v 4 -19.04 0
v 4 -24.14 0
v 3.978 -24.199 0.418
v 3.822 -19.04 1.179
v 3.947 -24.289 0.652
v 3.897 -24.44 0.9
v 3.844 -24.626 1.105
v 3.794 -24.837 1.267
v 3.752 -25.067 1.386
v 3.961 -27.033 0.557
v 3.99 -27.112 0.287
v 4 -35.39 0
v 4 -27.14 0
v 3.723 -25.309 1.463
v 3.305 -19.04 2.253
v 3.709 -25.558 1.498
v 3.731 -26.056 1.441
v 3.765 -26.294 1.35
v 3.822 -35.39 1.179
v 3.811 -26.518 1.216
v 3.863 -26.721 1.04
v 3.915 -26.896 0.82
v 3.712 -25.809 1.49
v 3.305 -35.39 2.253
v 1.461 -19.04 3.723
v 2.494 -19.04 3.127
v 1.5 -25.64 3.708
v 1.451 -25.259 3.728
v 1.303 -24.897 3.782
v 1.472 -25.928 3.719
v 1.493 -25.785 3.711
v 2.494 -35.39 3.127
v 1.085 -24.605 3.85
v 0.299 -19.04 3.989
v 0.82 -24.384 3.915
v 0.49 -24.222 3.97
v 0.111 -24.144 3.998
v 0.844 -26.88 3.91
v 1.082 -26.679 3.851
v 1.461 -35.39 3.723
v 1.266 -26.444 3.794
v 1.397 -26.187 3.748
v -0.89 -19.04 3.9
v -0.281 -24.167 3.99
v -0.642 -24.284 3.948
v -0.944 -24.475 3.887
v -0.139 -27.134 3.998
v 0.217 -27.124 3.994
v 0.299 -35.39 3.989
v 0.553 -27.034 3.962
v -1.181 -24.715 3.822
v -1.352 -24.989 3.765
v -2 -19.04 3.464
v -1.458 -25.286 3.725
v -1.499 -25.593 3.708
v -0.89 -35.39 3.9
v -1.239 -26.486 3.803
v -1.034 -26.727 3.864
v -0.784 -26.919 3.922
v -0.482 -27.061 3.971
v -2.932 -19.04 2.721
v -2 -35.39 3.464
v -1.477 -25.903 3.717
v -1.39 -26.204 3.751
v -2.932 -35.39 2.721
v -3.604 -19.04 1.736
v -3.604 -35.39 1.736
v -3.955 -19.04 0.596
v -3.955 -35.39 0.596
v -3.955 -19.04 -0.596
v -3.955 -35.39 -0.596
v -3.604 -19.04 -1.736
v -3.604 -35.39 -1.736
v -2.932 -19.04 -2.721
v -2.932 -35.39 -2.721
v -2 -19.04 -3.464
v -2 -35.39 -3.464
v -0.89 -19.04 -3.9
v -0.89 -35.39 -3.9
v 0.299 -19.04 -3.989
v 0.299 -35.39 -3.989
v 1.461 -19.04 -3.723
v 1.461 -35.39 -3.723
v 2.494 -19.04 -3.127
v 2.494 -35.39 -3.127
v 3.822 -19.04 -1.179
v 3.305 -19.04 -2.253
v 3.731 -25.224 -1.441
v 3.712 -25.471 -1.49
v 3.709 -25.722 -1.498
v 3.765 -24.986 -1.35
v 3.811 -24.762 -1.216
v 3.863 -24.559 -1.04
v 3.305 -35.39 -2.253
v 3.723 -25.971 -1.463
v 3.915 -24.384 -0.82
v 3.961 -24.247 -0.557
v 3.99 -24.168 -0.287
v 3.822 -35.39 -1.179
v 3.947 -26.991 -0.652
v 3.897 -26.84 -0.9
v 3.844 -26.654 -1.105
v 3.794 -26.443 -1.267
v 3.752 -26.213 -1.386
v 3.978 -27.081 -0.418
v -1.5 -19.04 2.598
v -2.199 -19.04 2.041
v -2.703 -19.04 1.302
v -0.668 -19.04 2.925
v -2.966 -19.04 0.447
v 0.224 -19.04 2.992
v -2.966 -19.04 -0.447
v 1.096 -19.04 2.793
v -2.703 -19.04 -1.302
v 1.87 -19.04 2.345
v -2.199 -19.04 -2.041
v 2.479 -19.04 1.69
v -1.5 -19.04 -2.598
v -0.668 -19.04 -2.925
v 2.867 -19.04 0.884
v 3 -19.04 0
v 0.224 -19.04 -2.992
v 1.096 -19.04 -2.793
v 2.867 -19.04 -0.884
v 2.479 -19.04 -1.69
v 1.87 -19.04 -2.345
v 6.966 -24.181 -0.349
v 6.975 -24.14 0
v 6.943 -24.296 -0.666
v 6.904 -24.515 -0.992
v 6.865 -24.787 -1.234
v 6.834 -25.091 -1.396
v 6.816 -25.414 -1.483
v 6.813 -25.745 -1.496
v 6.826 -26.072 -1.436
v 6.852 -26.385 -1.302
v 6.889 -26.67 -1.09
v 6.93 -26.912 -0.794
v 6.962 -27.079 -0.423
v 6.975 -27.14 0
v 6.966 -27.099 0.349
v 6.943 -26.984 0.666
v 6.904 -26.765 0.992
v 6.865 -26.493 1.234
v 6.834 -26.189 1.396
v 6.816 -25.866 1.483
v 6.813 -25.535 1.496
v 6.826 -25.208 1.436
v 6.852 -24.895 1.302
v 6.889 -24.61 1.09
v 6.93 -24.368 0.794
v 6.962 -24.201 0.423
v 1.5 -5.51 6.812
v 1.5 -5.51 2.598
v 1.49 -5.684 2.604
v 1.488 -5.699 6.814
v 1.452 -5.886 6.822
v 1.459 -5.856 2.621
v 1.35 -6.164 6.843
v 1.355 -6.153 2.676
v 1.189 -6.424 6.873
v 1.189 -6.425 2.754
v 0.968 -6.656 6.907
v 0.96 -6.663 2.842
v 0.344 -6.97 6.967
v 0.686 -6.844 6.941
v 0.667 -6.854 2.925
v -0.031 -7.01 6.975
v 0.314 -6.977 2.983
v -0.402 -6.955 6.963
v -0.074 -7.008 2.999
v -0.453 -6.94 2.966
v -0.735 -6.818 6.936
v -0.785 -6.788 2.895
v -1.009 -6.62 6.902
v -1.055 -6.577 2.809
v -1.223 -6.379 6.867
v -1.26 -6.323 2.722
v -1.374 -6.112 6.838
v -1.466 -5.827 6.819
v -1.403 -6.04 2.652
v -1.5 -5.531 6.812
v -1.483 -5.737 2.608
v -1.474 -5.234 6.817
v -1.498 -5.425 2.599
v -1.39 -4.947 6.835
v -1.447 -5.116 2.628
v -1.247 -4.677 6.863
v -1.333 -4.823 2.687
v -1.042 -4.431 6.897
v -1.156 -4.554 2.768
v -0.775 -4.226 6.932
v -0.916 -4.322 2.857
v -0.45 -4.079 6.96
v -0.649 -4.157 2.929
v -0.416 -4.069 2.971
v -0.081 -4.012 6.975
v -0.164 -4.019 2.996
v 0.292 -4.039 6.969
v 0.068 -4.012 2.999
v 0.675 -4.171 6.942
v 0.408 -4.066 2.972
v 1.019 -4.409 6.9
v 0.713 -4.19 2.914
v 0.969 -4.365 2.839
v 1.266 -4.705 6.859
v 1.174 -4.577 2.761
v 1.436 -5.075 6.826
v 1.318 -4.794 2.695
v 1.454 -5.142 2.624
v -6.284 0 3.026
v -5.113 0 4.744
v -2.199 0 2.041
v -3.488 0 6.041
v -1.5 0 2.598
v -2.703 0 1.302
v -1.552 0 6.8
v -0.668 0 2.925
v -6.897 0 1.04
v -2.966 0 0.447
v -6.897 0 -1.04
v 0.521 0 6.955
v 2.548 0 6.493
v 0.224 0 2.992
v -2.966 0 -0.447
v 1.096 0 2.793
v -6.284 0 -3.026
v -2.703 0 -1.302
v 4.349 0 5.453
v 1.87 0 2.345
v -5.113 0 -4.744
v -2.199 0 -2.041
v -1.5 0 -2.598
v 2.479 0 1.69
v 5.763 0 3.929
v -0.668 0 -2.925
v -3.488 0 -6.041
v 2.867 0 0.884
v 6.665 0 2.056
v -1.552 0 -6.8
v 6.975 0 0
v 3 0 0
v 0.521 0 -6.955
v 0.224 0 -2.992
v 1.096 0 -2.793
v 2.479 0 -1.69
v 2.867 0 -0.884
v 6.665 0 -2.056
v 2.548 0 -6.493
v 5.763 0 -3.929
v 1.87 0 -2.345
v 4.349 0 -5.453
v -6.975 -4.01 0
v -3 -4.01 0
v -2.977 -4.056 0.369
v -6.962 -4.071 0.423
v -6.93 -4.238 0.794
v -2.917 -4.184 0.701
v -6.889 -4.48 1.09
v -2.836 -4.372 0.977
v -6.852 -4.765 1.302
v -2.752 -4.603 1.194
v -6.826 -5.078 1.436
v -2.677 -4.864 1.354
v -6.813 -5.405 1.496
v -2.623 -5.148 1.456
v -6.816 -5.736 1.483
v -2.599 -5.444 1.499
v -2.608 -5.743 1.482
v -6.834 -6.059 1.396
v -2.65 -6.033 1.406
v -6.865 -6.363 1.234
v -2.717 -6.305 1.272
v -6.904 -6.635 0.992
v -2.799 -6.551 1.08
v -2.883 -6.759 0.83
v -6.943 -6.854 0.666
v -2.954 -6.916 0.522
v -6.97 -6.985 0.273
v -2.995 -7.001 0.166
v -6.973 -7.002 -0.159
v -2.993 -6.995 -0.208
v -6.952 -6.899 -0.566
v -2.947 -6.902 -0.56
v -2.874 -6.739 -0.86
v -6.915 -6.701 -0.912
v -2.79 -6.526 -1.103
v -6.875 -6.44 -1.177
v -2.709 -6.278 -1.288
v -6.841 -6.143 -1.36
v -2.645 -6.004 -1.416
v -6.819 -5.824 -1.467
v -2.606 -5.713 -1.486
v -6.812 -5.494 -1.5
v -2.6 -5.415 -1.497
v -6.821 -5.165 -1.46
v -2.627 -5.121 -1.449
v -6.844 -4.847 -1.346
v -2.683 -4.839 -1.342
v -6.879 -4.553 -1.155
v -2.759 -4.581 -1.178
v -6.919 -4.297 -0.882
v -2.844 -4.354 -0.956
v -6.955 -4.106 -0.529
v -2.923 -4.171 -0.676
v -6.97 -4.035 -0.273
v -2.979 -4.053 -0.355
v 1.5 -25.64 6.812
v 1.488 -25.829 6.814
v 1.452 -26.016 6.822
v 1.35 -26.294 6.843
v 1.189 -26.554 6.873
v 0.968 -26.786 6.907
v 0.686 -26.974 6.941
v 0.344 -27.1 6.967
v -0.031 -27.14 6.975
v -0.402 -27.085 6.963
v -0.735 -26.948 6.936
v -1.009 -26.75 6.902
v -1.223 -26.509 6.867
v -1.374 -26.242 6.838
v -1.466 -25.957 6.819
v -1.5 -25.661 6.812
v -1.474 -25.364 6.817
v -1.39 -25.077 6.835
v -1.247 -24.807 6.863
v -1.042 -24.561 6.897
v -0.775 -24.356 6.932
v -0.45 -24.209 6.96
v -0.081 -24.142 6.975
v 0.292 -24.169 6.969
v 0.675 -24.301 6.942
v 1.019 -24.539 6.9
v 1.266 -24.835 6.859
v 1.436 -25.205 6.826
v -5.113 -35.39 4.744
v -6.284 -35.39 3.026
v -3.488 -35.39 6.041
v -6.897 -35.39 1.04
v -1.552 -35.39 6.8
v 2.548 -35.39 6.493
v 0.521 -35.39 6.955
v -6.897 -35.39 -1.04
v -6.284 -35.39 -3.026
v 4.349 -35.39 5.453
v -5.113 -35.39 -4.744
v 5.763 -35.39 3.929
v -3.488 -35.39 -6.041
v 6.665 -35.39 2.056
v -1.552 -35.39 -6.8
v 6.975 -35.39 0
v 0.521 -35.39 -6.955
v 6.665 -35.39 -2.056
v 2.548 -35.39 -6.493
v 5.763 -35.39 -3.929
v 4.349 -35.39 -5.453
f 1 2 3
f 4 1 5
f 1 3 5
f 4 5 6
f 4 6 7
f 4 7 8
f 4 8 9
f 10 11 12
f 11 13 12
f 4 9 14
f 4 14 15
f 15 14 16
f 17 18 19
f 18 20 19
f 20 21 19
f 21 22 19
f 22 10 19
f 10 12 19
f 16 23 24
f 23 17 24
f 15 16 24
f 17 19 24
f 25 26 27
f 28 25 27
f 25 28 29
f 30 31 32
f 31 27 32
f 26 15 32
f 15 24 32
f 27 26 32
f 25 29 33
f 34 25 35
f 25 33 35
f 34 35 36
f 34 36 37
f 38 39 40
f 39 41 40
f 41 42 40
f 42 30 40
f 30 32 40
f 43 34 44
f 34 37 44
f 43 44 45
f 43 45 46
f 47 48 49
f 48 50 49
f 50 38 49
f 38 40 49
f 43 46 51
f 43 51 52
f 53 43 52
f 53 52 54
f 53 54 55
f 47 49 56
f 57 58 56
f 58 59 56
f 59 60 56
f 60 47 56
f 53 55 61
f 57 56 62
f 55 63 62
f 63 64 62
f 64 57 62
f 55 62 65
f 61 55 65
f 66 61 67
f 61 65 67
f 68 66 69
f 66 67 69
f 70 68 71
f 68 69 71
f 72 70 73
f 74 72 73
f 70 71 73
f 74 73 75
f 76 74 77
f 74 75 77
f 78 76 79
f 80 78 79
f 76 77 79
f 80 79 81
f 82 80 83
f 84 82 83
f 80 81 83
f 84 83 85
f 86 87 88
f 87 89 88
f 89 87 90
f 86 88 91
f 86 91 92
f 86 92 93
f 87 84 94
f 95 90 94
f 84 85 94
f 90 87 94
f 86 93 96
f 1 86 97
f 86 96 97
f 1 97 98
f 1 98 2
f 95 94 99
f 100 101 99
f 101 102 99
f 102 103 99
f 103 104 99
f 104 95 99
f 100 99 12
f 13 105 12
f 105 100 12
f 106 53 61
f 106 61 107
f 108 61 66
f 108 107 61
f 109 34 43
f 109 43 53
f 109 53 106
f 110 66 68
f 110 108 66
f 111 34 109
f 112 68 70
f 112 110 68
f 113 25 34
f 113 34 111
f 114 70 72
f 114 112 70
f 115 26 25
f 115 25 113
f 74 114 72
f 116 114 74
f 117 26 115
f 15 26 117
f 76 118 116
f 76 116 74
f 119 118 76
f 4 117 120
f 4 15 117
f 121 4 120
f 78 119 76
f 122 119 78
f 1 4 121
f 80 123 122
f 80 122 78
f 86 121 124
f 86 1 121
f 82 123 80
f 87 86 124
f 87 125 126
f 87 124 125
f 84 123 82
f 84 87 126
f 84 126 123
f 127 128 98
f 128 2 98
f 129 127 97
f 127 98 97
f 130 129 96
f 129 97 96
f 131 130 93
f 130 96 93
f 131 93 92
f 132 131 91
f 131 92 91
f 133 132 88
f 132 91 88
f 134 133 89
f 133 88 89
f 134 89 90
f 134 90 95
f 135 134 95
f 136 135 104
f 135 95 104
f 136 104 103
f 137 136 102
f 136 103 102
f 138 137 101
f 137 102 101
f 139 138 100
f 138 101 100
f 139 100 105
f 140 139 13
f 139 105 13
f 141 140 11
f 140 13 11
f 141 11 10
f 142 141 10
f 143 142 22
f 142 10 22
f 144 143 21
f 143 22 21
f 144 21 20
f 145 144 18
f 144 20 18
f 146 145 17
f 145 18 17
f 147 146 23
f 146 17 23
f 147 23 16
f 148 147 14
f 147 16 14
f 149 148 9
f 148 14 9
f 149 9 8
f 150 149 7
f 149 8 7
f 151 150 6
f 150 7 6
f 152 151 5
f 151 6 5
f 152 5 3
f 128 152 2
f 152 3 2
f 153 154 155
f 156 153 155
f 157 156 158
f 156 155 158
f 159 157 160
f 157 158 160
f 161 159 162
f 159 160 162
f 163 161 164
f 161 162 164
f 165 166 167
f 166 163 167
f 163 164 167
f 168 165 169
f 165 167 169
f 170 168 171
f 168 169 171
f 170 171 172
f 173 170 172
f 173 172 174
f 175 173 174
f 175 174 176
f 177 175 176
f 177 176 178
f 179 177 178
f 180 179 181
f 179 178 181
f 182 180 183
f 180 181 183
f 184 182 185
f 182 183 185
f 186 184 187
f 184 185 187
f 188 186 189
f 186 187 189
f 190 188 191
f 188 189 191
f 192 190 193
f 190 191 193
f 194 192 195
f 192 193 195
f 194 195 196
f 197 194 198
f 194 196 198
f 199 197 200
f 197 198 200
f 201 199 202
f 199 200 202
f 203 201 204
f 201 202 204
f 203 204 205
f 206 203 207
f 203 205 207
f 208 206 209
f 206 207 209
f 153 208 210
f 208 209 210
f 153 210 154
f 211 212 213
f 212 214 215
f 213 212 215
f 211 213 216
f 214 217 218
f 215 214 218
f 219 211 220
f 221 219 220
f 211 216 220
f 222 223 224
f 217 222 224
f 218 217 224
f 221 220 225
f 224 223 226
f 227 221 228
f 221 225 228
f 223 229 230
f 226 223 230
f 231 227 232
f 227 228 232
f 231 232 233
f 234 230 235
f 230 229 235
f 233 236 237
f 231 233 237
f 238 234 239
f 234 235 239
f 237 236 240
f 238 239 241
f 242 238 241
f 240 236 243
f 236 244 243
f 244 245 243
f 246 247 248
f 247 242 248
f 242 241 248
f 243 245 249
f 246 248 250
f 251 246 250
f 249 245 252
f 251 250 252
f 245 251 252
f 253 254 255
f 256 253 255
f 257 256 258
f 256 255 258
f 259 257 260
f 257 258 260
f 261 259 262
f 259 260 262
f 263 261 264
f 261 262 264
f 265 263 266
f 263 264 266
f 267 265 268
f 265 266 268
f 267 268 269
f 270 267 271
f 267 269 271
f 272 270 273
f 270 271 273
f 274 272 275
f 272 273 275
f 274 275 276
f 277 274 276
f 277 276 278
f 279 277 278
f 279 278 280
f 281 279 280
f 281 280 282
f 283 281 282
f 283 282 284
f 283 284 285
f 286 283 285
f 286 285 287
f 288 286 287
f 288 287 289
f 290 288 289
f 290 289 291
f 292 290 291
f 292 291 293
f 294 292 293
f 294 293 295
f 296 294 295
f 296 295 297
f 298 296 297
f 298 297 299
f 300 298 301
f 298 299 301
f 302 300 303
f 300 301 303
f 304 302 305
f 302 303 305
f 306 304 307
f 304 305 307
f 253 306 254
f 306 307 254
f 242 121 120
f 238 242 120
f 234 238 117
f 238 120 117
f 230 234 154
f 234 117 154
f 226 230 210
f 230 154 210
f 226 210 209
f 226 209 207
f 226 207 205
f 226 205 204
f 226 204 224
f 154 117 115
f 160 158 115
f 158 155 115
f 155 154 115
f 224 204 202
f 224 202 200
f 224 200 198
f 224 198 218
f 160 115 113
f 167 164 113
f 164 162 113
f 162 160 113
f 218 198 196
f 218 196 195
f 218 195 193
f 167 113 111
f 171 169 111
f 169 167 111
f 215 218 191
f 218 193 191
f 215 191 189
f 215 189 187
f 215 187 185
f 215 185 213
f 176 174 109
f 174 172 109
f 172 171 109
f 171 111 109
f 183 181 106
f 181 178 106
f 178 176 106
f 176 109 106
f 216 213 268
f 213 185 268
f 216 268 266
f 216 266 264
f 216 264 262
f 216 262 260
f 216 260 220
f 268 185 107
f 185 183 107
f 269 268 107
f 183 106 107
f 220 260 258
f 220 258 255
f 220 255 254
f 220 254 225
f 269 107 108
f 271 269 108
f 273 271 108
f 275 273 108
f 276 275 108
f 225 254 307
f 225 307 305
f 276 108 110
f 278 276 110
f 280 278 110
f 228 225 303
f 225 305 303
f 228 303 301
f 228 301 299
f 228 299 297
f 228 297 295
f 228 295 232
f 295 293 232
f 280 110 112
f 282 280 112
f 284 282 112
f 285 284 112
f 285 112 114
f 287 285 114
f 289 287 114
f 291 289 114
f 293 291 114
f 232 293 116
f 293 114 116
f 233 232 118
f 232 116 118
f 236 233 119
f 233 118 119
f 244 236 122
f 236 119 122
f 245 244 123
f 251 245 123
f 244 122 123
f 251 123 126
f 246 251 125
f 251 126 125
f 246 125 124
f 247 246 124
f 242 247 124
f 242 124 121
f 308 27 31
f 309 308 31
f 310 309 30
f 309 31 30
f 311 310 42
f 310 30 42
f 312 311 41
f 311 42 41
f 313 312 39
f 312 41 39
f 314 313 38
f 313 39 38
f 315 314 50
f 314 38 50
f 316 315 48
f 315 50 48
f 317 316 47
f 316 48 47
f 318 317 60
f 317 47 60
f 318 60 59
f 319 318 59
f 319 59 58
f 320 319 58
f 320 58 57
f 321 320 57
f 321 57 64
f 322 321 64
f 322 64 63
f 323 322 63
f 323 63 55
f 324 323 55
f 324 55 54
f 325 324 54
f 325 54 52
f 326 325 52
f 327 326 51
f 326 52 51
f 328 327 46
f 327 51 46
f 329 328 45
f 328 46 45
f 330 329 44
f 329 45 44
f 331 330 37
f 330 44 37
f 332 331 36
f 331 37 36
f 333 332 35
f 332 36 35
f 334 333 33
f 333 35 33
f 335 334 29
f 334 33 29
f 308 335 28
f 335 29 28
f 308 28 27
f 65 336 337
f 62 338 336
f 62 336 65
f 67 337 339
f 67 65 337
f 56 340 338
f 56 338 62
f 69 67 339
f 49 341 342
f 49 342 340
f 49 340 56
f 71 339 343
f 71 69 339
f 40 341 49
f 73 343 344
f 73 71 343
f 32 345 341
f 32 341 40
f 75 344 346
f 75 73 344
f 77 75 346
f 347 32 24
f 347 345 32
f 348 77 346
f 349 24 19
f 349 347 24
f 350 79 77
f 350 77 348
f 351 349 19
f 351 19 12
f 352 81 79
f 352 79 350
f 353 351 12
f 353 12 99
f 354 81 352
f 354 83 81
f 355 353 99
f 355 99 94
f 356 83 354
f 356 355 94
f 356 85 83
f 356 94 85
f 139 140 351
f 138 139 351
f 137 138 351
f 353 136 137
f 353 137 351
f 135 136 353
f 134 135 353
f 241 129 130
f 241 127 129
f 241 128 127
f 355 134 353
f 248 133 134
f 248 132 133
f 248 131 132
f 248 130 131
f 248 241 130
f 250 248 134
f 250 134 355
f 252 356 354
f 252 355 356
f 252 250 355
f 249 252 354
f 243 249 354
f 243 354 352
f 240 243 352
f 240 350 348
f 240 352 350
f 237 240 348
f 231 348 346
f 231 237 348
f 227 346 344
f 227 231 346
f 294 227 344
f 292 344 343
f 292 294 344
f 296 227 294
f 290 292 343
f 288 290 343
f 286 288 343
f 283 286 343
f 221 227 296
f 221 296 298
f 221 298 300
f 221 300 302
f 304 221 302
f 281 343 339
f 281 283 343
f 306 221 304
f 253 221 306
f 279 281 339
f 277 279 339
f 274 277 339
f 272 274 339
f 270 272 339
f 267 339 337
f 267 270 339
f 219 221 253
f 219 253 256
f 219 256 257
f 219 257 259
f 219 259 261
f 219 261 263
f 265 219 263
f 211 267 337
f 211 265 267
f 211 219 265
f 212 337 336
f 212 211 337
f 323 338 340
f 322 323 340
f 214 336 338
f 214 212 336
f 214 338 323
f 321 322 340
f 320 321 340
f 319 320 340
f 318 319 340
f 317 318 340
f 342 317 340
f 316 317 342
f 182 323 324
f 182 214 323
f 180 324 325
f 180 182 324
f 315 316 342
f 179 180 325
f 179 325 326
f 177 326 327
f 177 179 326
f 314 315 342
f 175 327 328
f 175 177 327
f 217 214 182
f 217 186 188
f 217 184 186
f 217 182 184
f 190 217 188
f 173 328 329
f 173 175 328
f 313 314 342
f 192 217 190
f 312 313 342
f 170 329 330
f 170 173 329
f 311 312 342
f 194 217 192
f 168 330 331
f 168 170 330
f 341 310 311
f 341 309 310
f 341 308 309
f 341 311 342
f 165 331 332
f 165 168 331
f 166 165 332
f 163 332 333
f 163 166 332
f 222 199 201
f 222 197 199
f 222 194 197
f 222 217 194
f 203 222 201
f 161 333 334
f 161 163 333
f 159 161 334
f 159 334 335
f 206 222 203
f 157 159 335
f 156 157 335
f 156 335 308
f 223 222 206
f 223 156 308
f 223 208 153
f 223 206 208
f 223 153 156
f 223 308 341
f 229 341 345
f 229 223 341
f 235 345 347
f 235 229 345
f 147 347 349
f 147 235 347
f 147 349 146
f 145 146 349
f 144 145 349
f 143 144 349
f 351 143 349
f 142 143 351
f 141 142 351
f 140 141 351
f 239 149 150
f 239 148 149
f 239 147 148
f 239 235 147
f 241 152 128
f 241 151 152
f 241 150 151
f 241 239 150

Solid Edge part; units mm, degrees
sketch "Sketch1" plane through (0, 0, 0) normal (0, -1, 0) x (1, 0, 0)
  circle A0 centre (0, 0) radius 6.975
extrude "Protrusion1" add sketch "Sketch1" along normal blind 35.39
sketch "Sketch2" plane through (0, -35.39, 0) normal (0, -1, 0) x (1, 0, 0)
  circle A0 centre (0, 0) radius 3
extrude "Cutout1" cut sketch "Sketch2" against normal through all
sketch "Sketch3" plane through (0, -35.39, 0) normal (0, -1, 0) x (1, 0, 0)
  circle A0 centre (0, 0) radius 4
extrude "ExtrudedCutout_2" cut sketch "Sketch3" against normal blind 16.35
sketch "Sketch4" plane through (0, 0, 0) normal (0, 0, 1) x (1, 0, 0)
  circle A0 centre (0, -25.64) radius 1.5
  circle A1 centre (0, -5.51) radius 1.5
  dimension "D1" = 3
  dimension "D2" = 3
extrude "ExtrudedCutout_3" cut sketch "Sketch4" along normal blind 12.2726
sketch "Sketch5" plane through (0, 0, 0) normal (1, 0, 0) x (0, 1, 0)
  circle A0 centre (-25.64, 0) radius 1.5
extrude "ExtrudedCutout_4" cut sketch "Sketch5" along normal blind 9.4946
sketch "Sketch6" plane through (0, 0, 0) normal (1, 0, 0) x (0, 1, 0)
  circle A0 centre (-5.51, 0) radius 1.5
extrude "ExtrudedCutout_5" cut sketch "Sketch6" against normal blind 15.7832
properties material "Aluminum, 5050"
